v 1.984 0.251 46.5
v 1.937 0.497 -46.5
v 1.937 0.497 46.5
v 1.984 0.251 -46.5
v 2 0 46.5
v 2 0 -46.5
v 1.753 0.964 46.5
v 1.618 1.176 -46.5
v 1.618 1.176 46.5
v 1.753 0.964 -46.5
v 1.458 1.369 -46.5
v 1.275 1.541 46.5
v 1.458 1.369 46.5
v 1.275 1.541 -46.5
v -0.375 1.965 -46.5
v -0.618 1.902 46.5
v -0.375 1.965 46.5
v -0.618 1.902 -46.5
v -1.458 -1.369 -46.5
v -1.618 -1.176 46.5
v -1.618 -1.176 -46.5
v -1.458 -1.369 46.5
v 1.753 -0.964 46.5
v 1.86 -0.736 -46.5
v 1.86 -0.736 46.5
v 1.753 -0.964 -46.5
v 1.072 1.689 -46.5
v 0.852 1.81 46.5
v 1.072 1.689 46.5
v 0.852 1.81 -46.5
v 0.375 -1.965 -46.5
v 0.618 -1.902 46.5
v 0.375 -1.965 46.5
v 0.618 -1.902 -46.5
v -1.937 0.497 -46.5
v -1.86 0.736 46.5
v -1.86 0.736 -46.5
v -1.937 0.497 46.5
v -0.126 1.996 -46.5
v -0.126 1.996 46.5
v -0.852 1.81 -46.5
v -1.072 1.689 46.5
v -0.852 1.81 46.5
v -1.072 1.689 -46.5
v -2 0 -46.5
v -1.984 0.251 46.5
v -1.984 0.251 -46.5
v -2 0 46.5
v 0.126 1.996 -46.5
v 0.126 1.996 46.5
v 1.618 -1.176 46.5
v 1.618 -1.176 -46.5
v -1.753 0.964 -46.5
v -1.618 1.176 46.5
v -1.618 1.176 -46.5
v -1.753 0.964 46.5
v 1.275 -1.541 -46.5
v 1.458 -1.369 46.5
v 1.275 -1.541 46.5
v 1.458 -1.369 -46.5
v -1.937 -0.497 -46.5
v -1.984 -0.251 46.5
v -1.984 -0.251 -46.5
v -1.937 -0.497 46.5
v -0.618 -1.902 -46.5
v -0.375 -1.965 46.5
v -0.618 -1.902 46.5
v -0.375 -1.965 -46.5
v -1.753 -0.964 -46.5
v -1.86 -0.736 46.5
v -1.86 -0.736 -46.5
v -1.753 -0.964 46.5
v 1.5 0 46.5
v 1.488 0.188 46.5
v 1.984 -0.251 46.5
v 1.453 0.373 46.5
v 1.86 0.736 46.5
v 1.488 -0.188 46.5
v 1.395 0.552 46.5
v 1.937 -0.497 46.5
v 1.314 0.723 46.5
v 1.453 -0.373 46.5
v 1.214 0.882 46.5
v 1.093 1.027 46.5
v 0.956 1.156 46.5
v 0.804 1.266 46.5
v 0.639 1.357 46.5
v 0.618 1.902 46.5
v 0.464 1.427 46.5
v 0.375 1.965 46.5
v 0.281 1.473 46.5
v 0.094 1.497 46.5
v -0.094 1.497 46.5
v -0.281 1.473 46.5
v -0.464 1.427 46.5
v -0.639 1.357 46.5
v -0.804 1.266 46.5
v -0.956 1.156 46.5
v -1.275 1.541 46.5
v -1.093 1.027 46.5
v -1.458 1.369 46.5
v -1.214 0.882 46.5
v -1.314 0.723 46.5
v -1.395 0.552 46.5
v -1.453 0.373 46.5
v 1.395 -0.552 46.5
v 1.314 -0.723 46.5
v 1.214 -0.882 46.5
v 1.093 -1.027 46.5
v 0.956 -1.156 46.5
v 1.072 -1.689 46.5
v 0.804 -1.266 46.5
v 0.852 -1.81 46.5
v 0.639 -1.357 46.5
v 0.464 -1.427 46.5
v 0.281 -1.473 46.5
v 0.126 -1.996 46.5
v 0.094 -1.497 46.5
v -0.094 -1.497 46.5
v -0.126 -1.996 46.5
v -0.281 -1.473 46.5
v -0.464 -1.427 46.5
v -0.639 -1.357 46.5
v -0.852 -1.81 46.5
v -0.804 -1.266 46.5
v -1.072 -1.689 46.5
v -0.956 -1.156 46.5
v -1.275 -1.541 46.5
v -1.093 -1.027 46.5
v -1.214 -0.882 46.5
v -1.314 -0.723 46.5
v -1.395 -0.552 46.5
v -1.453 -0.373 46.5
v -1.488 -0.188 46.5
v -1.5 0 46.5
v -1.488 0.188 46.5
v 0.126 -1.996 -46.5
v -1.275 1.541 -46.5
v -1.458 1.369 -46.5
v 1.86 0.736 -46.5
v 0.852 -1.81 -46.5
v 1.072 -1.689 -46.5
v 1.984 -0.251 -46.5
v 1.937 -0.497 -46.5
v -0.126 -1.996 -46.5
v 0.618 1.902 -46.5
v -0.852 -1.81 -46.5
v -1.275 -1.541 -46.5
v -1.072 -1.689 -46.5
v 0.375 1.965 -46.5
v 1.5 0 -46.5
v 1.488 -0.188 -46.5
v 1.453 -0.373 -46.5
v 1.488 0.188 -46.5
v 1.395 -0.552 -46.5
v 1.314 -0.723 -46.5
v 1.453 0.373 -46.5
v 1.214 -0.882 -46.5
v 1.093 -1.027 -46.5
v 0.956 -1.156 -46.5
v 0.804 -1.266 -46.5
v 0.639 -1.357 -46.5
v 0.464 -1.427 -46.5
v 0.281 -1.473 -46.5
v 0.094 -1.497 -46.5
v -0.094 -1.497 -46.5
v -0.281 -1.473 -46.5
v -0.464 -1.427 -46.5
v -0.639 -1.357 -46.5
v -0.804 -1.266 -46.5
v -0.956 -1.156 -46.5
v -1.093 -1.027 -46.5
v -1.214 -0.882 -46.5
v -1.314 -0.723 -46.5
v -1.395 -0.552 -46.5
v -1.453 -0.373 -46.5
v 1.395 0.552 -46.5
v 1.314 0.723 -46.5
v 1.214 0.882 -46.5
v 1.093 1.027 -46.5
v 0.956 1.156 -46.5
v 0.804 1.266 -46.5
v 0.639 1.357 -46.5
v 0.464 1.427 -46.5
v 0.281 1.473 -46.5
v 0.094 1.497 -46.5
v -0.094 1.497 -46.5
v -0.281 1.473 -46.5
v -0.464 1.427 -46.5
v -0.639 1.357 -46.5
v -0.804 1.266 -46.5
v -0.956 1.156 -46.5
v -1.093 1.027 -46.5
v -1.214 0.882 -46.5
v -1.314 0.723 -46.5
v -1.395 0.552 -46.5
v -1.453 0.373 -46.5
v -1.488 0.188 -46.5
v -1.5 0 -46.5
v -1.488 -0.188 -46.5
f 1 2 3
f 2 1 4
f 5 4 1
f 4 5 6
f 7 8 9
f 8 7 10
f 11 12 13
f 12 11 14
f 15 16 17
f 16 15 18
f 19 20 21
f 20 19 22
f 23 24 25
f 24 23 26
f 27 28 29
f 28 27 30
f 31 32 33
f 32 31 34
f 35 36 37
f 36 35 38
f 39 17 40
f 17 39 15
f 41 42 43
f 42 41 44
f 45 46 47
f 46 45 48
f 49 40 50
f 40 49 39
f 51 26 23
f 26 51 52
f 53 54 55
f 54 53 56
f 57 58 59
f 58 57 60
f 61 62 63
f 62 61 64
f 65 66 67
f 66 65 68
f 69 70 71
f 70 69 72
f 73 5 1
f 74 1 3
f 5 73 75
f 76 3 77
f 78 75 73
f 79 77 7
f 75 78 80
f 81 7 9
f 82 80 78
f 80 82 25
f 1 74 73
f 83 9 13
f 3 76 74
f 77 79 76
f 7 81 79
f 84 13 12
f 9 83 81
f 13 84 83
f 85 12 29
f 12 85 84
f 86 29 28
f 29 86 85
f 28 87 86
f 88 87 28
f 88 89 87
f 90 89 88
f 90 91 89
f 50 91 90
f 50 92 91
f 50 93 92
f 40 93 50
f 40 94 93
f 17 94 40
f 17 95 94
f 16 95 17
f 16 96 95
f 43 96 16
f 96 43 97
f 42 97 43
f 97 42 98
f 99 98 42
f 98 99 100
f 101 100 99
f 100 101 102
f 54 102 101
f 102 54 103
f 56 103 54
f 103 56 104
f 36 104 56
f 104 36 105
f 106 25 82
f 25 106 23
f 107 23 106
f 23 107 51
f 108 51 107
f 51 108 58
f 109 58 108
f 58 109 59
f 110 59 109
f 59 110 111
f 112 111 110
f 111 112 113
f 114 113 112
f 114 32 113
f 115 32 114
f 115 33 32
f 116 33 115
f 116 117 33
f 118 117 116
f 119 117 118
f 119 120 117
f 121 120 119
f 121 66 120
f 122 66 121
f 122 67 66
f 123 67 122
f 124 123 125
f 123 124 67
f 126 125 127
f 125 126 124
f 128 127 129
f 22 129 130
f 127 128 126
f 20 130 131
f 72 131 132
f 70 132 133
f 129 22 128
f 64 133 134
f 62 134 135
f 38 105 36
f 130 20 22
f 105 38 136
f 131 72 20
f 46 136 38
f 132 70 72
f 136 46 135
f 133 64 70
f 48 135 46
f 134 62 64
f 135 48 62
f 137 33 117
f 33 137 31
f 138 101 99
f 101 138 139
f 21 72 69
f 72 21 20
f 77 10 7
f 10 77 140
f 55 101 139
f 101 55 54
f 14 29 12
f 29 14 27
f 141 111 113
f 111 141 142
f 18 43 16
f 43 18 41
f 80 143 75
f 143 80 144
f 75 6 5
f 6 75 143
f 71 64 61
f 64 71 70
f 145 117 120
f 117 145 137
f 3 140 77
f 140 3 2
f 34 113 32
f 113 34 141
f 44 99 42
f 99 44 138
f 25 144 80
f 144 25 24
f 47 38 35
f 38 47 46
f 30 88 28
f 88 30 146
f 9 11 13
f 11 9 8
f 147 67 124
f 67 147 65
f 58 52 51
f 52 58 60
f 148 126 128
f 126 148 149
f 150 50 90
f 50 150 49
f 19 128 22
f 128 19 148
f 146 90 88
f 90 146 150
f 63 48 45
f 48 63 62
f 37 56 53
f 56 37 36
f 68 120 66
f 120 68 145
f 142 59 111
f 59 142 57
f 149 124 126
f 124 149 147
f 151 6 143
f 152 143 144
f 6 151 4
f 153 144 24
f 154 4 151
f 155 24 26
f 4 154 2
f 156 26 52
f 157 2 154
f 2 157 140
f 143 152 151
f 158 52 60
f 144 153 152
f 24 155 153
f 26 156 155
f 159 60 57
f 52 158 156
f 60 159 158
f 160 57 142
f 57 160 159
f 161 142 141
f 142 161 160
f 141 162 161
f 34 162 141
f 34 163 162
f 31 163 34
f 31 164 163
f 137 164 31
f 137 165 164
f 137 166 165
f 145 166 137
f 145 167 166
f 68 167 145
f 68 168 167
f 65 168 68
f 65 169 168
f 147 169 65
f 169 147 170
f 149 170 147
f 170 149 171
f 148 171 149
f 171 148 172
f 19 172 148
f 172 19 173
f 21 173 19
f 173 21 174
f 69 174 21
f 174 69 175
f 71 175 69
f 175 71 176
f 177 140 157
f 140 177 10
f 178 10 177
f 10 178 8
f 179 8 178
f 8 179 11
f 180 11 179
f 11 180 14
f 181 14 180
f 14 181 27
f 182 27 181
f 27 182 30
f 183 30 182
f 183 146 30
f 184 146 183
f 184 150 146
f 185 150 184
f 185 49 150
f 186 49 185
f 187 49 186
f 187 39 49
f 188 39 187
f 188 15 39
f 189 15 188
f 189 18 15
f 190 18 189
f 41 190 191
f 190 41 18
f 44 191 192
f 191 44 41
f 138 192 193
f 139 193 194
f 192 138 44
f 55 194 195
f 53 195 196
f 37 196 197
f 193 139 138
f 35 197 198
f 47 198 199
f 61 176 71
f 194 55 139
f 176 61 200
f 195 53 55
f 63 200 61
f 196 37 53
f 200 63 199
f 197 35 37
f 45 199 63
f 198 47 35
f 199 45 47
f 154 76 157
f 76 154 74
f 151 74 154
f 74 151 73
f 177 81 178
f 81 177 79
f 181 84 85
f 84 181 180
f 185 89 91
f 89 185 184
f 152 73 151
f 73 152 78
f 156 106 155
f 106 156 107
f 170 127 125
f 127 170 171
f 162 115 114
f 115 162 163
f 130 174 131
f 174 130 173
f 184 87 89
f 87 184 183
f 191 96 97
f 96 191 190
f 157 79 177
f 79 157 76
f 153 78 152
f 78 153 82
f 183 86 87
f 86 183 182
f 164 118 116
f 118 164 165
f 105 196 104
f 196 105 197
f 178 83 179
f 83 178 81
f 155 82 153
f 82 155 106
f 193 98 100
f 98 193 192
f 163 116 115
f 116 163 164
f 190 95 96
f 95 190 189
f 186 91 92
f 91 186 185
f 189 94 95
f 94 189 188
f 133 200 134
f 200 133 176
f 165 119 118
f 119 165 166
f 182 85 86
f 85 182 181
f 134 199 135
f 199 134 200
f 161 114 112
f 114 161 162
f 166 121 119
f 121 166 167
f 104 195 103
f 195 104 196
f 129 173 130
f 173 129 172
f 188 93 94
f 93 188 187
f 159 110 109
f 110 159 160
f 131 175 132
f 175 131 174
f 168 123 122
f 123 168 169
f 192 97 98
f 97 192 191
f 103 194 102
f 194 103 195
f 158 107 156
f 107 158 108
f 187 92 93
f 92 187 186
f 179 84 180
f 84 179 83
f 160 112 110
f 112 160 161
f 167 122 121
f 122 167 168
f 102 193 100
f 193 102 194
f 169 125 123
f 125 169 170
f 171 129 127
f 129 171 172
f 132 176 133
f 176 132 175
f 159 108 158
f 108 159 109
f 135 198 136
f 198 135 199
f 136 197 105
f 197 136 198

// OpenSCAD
$fn = 50;


difference() {
	union() {
		translate(v = [0, 0, -46.5000000000]) {
			cylinder(h = 93, r = 2.0000000000);
		}
	}
	union() {
		translate(v = [0, 0, -100.0000000000]) {
			cylinder(h = 200, r = 1.5000000000);
		}
	}
}
